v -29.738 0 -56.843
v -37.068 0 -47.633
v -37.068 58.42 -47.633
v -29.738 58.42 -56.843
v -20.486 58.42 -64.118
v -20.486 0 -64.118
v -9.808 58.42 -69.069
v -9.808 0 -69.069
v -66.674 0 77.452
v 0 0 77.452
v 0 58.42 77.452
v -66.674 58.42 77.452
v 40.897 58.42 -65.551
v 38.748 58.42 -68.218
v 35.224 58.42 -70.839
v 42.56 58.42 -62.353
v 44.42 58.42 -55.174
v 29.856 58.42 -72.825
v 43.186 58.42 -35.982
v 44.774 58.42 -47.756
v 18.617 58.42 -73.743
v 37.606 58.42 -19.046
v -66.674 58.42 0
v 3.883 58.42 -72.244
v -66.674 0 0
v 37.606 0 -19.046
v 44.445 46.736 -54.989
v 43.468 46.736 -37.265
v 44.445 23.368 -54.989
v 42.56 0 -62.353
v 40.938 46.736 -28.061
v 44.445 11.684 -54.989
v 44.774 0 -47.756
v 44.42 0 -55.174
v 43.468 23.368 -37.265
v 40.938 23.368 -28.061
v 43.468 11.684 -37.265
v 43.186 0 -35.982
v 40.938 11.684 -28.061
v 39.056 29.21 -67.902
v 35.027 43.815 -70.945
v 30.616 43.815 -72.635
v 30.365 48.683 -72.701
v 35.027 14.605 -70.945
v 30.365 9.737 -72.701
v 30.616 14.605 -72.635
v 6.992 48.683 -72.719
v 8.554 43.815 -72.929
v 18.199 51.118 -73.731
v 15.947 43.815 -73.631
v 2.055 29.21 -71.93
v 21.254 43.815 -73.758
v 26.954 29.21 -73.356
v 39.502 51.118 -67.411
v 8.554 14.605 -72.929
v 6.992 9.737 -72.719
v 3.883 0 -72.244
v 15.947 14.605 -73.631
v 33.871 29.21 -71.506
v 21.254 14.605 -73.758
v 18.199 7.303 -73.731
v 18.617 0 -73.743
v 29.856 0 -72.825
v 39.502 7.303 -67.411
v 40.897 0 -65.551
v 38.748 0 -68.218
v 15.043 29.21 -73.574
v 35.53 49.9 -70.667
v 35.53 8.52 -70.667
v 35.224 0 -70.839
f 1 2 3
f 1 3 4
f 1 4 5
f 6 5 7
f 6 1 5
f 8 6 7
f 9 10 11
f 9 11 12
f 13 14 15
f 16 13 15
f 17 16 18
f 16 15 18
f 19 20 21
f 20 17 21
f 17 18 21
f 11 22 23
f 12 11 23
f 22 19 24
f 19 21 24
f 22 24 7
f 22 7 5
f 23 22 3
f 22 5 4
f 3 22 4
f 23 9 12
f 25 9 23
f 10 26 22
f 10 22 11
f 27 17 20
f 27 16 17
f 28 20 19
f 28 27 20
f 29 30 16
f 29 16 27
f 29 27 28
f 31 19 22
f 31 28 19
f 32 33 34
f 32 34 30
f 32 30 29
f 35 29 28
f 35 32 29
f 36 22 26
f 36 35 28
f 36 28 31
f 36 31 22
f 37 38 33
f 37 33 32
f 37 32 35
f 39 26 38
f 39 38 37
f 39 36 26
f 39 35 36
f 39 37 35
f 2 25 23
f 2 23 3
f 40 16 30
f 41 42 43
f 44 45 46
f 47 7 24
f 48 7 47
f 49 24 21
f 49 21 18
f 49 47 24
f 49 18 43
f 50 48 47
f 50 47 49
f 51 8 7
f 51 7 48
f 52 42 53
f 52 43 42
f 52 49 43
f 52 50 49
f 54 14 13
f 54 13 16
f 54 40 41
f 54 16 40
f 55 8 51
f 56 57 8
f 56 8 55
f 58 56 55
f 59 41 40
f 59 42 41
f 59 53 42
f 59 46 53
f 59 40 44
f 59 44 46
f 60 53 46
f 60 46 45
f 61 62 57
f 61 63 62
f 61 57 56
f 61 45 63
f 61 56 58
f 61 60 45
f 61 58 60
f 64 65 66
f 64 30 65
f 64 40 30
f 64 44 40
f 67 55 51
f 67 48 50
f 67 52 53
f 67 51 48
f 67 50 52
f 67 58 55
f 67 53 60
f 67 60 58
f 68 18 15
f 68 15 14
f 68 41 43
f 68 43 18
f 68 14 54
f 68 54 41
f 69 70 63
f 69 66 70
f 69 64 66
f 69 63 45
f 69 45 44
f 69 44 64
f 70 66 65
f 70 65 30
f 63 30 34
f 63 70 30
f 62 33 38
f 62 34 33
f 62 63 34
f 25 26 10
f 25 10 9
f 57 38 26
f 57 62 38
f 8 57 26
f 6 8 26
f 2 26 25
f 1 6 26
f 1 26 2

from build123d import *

# Parameters (mm, degrees)
BOSS_EXTRUDE1_DEPTH = 58.42
FILLET9_START       = -1
FILLET9_DEPTH       = 60
FILLET9_2_DEPTH     = 58.42


with BuildPart() as part:
    # Sketch1 → Boss-Extrude1 (new body)
    with BuildSketch(Plane(origin=(0, 0, 0), x_dir=(1, 0, 0), z_dir=(0, 1, 0))):
        with BuildLine():
            Line((-66.673768512, 0), (-37.067821873, 47.633329988))
            ThreePointArc((-37.067821873, 47.633329988), (-11.329209284, 68.541566023), (21.82652777, 69.113940477))
            Line((21.82652777, 69.113940477), (53.138492197, 58.903517294))
            Line((53.138492197, 58.903517294), (0, -77.45185891))
            Line((0, -77.45185891), (-66.673768512, -77.45185891))
            Line((-66.673768512, -77.45185891), (-66.673768512, 0))
        make_face()
    extrude(amount=BOSS_EXTRUDE1_DEPTH)

    # Fillet9: read off the stored shape, not the designer's step
    # Fillet9 outline → Fillet9 (cut)
    with BuildSketch(Plane(origin=(0, 0, 0), x_dir=(1, 0, 0), z_dir=(0, 1, 0)).offset(FILLET9_START)):
        with BuildLine():
            Line((53.138492197, 58.903517294), (42.560128995, 62.352983555))
            add(Edge.make_bspline(
                [(42.560128995, 62.352983555), (45.276451429, 55.785497085), (45.88017533, 47.021967979), (44.583604834, 36.951353495), (41.094604397, 27.998446712), (37.605603959, 19.045539929)],
                knots=[0.582099673, 0.582099673, 0.582099673, 0.582099673, 0.582099673, 0.582099673, 1, 1, 1, 1, 1, 1], degree=5))
            Line((37.605603959, 19.045539929), (53.138492197, 58.903517294))
        make_face()
    extrude(amount=FILLET9_DEPTH, mode=Mode.SUBTRACT)

    # Fillet9 2 outline → Fillet9 2 (add)
    with BuildSketch(Plane(origin=(0, 0, 0), x_dir=(1, 0, 0), z_dir=(0, 1, 0))):
        with BuildLine():
            add(Edge.make_bspline(
                [(-9.808315325, 69.069133652), (-0.482865879, 72.139293798), (12.240866744, 73.831219733), (27.210316696, 75.821767739), (36.460068296, 72.746962644), (41.411307971, 64.848690609), (42.026486953, 63.643215838), (42.560128995, 62.352983555)],
                knots=[0, 0, 0, 0, 0, 0, 0.5, 0.5, 0.582099673, 0.582099673, 0.582099673, 0.582099673, 0.582099673, 0.582099673], degree=5))
            ThreePointArc((-9.808315325, 69.069133652), (6.005529482, 71.616813676), (21.82652777, 69.113940477))
            Line((21.82652777, 69.113940477), (42.560128995, 62.352983555))
        make_face()
    extrude(amount=FILLET9_2_DEPTH)


solid = part.part
